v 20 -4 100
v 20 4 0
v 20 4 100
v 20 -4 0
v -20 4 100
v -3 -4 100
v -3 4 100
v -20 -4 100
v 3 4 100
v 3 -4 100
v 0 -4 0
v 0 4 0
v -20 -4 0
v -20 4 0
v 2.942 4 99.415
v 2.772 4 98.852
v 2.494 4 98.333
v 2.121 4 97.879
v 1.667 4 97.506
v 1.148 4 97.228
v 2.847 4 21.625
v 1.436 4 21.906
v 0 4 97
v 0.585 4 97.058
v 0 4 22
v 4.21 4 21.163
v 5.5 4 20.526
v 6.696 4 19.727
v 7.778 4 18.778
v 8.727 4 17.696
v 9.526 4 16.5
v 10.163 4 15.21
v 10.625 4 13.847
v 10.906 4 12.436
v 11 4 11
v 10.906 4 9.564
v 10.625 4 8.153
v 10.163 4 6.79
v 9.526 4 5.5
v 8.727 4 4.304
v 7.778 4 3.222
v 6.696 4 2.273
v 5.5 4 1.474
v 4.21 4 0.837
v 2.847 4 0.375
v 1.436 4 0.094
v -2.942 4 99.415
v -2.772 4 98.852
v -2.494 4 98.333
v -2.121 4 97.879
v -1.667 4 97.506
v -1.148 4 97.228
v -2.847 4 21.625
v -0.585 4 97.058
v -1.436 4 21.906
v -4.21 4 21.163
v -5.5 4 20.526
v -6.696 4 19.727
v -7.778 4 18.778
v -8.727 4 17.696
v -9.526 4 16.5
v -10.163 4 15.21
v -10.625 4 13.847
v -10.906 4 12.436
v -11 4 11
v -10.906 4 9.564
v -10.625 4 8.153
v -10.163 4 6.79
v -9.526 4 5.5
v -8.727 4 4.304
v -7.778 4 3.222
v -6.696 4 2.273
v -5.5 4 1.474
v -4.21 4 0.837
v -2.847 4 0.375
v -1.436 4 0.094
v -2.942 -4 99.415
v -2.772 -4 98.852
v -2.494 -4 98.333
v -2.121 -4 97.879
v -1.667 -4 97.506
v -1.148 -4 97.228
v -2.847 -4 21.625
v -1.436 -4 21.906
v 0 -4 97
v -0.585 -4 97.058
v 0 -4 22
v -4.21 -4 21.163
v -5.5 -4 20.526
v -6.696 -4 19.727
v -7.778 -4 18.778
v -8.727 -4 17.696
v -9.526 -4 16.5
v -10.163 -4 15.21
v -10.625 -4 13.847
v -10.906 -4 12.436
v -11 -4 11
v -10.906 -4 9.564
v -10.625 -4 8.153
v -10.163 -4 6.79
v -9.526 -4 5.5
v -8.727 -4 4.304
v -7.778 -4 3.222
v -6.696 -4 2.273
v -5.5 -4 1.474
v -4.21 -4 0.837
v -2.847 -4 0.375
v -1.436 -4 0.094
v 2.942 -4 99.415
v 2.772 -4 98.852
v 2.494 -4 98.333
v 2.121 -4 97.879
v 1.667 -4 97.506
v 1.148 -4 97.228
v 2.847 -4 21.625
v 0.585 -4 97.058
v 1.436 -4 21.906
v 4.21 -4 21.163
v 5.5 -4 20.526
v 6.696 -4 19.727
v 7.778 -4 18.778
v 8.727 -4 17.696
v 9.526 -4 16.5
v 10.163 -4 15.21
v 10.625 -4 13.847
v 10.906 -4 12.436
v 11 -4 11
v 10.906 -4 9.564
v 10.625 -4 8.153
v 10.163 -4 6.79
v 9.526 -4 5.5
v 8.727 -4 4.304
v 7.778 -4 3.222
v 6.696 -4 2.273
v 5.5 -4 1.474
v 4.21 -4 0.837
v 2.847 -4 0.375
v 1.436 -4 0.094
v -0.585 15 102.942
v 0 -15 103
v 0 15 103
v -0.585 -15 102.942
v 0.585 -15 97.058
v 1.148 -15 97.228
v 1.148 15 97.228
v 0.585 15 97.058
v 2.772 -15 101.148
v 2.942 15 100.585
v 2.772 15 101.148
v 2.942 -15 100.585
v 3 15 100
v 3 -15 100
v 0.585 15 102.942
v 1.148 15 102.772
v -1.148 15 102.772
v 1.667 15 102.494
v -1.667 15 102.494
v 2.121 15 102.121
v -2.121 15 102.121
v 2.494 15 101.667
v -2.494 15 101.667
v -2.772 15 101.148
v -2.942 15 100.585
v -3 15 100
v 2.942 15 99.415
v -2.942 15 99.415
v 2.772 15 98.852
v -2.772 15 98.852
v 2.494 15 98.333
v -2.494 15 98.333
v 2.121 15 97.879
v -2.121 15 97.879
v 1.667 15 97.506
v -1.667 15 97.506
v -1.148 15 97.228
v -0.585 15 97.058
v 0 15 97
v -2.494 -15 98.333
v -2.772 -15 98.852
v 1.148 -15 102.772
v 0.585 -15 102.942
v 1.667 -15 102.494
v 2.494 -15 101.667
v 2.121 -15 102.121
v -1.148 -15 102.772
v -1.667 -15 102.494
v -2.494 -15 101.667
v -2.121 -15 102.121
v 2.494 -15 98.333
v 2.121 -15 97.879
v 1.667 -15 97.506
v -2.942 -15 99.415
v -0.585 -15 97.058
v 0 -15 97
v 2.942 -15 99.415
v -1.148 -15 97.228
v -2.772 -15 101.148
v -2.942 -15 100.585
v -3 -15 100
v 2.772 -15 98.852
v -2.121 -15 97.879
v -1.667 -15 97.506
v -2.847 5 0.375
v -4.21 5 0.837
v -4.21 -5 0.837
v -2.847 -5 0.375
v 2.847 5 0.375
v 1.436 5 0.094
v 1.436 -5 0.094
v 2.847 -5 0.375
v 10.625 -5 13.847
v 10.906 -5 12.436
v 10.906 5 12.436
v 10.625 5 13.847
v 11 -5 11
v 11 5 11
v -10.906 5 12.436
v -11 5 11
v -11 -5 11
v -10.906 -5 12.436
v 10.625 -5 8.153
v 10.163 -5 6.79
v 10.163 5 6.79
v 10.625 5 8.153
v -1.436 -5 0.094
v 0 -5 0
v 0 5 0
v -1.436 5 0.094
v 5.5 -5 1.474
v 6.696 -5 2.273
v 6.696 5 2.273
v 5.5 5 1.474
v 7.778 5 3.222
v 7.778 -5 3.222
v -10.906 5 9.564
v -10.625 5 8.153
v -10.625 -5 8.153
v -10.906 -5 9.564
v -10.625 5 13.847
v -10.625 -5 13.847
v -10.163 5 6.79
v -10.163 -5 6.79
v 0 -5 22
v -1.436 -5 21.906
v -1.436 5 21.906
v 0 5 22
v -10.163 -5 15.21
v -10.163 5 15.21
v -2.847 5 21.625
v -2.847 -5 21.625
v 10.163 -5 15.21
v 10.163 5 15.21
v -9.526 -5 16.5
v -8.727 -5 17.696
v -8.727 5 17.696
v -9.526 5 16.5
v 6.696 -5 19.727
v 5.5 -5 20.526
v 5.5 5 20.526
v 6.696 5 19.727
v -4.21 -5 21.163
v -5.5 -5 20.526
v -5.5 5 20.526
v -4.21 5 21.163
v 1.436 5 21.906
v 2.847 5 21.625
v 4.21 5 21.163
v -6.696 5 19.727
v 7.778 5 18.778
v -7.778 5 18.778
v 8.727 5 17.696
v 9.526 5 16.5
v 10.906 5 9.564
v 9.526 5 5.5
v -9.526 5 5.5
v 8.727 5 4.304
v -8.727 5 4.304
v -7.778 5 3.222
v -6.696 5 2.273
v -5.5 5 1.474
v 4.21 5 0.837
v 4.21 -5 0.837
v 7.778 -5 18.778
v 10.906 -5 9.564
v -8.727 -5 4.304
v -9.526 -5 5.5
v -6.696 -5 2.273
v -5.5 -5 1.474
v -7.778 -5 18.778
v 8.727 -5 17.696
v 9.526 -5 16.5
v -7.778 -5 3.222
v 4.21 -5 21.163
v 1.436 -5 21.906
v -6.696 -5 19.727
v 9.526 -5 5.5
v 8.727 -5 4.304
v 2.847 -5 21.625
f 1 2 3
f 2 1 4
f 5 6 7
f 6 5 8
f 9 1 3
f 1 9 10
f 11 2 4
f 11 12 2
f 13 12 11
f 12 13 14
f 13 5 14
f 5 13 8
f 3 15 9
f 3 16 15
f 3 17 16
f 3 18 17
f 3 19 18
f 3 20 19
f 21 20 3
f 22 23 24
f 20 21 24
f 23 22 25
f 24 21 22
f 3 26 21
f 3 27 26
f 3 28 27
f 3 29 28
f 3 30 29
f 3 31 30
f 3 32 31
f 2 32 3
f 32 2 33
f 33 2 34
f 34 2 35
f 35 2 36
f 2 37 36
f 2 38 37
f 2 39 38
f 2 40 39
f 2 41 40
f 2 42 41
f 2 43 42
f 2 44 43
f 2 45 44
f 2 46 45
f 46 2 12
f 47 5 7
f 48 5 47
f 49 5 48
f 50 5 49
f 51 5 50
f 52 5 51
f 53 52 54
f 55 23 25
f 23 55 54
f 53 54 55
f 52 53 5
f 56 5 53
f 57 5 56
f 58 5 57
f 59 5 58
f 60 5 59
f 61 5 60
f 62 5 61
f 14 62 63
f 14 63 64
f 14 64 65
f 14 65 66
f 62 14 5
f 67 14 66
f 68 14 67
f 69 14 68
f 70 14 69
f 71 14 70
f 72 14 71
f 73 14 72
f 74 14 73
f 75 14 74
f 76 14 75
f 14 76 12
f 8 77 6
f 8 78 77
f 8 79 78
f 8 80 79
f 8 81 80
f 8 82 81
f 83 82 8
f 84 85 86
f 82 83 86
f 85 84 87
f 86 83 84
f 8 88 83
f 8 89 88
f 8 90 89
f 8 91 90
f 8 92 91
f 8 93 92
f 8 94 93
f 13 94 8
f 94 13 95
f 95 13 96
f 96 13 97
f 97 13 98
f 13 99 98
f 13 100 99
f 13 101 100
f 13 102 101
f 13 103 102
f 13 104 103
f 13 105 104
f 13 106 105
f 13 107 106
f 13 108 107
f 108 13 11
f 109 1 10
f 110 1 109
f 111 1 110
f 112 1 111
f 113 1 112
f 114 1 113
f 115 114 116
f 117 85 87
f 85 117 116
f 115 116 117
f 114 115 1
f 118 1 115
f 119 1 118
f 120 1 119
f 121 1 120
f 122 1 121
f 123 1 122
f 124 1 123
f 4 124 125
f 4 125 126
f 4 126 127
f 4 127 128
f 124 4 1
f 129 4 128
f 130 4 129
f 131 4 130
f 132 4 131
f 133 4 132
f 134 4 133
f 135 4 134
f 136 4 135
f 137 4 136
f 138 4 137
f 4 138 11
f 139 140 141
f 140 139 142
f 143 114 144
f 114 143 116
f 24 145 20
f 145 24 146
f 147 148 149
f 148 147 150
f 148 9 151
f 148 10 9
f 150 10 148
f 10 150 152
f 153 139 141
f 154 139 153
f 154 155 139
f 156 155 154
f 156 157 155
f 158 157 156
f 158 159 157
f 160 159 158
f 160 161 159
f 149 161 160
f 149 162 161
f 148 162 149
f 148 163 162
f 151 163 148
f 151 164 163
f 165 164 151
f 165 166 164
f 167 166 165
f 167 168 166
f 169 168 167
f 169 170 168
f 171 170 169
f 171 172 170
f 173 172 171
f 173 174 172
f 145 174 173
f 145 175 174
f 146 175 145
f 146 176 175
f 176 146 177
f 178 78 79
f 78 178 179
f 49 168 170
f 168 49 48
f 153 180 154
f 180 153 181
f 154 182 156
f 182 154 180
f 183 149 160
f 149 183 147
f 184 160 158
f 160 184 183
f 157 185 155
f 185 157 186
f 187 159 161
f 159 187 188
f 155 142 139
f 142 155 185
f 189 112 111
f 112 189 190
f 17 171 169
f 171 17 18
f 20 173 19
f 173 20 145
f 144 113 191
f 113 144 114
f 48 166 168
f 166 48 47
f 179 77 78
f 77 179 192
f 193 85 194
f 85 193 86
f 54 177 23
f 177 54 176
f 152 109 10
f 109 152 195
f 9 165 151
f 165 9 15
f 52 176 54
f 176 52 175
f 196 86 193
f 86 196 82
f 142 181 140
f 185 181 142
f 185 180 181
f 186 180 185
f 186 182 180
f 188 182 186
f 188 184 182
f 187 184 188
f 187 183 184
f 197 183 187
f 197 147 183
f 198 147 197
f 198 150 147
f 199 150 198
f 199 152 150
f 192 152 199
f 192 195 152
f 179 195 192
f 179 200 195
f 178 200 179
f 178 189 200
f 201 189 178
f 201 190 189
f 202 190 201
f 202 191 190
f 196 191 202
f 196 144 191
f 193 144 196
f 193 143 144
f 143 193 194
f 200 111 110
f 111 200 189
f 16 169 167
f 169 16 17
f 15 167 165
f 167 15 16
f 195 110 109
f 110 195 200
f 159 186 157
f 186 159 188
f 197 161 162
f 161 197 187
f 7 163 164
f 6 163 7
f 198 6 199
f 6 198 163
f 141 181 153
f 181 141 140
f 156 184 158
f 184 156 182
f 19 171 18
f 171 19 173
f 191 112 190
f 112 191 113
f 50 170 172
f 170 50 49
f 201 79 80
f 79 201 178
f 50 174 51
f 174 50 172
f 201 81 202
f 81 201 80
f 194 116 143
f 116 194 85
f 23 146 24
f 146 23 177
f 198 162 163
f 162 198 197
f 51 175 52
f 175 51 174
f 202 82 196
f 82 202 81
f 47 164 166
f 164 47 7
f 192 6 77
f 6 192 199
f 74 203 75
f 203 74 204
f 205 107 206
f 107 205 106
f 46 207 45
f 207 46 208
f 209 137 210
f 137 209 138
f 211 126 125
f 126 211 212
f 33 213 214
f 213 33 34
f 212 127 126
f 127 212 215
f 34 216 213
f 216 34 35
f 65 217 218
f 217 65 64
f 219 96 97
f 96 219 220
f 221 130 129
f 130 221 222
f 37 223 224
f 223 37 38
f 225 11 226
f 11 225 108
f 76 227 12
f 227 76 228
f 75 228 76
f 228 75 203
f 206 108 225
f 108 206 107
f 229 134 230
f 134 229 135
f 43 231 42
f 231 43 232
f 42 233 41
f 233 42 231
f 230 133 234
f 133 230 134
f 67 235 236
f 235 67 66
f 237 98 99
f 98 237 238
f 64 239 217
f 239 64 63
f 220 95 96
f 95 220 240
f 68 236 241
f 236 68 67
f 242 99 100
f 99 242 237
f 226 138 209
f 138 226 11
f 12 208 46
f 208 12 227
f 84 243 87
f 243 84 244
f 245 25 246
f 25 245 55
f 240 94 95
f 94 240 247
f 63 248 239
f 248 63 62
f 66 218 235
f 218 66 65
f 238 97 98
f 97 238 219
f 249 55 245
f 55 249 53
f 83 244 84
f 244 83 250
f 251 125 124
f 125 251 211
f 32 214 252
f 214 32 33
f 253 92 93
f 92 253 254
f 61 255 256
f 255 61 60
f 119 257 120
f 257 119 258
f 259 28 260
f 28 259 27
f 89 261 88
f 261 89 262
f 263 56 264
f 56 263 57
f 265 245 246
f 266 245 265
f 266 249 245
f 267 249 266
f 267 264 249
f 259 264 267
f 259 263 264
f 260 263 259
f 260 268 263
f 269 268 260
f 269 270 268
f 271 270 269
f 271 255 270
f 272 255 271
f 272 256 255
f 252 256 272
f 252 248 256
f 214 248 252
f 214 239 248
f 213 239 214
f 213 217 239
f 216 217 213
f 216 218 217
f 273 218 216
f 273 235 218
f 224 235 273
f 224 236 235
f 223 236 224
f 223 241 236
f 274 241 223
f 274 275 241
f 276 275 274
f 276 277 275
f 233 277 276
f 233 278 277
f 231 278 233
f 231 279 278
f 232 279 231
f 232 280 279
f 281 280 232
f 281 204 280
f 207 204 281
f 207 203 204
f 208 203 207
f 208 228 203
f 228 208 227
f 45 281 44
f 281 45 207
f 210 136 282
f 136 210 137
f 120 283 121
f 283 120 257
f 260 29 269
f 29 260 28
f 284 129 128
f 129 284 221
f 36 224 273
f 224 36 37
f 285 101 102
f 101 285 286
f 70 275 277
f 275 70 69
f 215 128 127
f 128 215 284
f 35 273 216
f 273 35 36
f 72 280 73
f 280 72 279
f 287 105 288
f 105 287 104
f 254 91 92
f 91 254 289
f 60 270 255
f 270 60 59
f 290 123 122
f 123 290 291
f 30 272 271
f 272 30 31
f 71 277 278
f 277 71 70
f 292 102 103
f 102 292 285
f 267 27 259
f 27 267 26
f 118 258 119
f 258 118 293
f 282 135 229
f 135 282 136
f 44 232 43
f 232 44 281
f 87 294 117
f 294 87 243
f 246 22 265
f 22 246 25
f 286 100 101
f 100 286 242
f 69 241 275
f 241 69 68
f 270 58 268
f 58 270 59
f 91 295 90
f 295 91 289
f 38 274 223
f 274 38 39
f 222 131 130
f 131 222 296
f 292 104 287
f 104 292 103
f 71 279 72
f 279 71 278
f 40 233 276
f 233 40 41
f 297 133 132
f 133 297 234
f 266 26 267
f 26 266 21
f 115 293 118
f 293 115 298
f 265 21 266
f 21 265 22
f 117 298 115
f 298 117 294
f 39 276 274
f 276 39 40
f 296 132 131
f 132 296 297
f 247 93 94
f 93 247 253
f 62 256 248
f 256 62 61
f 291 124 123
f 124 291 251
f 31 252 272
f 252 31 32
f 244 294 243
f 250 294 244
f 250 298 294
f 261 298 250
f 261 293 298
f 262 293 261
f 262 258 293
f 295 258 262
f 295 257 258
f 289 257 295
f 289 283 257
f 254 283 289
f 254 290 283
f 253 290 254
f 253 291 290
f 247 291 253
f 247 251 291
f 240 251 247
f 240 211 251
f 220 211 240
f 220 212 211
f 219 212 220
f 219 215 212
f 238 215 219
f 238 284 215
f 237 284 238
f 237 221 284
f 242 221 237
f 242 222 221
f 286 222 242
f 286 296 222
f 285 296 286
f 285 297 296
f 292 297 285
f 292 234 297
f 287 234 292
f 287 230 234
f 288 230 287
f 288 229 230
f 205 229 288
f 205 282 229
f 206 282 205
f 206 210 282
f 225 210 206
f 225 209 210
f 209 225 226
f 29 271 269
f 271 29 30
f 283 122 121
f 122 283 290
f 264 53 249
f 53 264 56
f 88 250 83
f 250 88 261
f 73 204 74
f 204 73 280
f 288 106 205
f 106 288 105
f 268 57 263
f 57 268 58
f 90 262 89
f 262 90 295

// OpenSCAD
paddle_width=40; paddle_height=100; paddle_thickness=8; axle_diameter=6; axle_length=30;
module pendulum_paddle(){ union(){ translate([-paddle_width/2,-paddle_thickness/2,0]) cube([paddle_width,paddle_thickness,paddle_height]); translate([0,0,paddle_height]) rotate([90,0,0]) cylinder(d=axle_diameter,h=axle_length,center=true,$fn=32); translate([0,0,11]) rotate([90,0,0]) cylinder(d=22,h=paddle_thickness+2,center=true,$fn=48); }}
assert(paddle_width==40 && paddle_height==100 && axle_diameter==6); echo("SCADCTL_REQUIREMENT:parameters:PASS"); pendulum_paddle();
